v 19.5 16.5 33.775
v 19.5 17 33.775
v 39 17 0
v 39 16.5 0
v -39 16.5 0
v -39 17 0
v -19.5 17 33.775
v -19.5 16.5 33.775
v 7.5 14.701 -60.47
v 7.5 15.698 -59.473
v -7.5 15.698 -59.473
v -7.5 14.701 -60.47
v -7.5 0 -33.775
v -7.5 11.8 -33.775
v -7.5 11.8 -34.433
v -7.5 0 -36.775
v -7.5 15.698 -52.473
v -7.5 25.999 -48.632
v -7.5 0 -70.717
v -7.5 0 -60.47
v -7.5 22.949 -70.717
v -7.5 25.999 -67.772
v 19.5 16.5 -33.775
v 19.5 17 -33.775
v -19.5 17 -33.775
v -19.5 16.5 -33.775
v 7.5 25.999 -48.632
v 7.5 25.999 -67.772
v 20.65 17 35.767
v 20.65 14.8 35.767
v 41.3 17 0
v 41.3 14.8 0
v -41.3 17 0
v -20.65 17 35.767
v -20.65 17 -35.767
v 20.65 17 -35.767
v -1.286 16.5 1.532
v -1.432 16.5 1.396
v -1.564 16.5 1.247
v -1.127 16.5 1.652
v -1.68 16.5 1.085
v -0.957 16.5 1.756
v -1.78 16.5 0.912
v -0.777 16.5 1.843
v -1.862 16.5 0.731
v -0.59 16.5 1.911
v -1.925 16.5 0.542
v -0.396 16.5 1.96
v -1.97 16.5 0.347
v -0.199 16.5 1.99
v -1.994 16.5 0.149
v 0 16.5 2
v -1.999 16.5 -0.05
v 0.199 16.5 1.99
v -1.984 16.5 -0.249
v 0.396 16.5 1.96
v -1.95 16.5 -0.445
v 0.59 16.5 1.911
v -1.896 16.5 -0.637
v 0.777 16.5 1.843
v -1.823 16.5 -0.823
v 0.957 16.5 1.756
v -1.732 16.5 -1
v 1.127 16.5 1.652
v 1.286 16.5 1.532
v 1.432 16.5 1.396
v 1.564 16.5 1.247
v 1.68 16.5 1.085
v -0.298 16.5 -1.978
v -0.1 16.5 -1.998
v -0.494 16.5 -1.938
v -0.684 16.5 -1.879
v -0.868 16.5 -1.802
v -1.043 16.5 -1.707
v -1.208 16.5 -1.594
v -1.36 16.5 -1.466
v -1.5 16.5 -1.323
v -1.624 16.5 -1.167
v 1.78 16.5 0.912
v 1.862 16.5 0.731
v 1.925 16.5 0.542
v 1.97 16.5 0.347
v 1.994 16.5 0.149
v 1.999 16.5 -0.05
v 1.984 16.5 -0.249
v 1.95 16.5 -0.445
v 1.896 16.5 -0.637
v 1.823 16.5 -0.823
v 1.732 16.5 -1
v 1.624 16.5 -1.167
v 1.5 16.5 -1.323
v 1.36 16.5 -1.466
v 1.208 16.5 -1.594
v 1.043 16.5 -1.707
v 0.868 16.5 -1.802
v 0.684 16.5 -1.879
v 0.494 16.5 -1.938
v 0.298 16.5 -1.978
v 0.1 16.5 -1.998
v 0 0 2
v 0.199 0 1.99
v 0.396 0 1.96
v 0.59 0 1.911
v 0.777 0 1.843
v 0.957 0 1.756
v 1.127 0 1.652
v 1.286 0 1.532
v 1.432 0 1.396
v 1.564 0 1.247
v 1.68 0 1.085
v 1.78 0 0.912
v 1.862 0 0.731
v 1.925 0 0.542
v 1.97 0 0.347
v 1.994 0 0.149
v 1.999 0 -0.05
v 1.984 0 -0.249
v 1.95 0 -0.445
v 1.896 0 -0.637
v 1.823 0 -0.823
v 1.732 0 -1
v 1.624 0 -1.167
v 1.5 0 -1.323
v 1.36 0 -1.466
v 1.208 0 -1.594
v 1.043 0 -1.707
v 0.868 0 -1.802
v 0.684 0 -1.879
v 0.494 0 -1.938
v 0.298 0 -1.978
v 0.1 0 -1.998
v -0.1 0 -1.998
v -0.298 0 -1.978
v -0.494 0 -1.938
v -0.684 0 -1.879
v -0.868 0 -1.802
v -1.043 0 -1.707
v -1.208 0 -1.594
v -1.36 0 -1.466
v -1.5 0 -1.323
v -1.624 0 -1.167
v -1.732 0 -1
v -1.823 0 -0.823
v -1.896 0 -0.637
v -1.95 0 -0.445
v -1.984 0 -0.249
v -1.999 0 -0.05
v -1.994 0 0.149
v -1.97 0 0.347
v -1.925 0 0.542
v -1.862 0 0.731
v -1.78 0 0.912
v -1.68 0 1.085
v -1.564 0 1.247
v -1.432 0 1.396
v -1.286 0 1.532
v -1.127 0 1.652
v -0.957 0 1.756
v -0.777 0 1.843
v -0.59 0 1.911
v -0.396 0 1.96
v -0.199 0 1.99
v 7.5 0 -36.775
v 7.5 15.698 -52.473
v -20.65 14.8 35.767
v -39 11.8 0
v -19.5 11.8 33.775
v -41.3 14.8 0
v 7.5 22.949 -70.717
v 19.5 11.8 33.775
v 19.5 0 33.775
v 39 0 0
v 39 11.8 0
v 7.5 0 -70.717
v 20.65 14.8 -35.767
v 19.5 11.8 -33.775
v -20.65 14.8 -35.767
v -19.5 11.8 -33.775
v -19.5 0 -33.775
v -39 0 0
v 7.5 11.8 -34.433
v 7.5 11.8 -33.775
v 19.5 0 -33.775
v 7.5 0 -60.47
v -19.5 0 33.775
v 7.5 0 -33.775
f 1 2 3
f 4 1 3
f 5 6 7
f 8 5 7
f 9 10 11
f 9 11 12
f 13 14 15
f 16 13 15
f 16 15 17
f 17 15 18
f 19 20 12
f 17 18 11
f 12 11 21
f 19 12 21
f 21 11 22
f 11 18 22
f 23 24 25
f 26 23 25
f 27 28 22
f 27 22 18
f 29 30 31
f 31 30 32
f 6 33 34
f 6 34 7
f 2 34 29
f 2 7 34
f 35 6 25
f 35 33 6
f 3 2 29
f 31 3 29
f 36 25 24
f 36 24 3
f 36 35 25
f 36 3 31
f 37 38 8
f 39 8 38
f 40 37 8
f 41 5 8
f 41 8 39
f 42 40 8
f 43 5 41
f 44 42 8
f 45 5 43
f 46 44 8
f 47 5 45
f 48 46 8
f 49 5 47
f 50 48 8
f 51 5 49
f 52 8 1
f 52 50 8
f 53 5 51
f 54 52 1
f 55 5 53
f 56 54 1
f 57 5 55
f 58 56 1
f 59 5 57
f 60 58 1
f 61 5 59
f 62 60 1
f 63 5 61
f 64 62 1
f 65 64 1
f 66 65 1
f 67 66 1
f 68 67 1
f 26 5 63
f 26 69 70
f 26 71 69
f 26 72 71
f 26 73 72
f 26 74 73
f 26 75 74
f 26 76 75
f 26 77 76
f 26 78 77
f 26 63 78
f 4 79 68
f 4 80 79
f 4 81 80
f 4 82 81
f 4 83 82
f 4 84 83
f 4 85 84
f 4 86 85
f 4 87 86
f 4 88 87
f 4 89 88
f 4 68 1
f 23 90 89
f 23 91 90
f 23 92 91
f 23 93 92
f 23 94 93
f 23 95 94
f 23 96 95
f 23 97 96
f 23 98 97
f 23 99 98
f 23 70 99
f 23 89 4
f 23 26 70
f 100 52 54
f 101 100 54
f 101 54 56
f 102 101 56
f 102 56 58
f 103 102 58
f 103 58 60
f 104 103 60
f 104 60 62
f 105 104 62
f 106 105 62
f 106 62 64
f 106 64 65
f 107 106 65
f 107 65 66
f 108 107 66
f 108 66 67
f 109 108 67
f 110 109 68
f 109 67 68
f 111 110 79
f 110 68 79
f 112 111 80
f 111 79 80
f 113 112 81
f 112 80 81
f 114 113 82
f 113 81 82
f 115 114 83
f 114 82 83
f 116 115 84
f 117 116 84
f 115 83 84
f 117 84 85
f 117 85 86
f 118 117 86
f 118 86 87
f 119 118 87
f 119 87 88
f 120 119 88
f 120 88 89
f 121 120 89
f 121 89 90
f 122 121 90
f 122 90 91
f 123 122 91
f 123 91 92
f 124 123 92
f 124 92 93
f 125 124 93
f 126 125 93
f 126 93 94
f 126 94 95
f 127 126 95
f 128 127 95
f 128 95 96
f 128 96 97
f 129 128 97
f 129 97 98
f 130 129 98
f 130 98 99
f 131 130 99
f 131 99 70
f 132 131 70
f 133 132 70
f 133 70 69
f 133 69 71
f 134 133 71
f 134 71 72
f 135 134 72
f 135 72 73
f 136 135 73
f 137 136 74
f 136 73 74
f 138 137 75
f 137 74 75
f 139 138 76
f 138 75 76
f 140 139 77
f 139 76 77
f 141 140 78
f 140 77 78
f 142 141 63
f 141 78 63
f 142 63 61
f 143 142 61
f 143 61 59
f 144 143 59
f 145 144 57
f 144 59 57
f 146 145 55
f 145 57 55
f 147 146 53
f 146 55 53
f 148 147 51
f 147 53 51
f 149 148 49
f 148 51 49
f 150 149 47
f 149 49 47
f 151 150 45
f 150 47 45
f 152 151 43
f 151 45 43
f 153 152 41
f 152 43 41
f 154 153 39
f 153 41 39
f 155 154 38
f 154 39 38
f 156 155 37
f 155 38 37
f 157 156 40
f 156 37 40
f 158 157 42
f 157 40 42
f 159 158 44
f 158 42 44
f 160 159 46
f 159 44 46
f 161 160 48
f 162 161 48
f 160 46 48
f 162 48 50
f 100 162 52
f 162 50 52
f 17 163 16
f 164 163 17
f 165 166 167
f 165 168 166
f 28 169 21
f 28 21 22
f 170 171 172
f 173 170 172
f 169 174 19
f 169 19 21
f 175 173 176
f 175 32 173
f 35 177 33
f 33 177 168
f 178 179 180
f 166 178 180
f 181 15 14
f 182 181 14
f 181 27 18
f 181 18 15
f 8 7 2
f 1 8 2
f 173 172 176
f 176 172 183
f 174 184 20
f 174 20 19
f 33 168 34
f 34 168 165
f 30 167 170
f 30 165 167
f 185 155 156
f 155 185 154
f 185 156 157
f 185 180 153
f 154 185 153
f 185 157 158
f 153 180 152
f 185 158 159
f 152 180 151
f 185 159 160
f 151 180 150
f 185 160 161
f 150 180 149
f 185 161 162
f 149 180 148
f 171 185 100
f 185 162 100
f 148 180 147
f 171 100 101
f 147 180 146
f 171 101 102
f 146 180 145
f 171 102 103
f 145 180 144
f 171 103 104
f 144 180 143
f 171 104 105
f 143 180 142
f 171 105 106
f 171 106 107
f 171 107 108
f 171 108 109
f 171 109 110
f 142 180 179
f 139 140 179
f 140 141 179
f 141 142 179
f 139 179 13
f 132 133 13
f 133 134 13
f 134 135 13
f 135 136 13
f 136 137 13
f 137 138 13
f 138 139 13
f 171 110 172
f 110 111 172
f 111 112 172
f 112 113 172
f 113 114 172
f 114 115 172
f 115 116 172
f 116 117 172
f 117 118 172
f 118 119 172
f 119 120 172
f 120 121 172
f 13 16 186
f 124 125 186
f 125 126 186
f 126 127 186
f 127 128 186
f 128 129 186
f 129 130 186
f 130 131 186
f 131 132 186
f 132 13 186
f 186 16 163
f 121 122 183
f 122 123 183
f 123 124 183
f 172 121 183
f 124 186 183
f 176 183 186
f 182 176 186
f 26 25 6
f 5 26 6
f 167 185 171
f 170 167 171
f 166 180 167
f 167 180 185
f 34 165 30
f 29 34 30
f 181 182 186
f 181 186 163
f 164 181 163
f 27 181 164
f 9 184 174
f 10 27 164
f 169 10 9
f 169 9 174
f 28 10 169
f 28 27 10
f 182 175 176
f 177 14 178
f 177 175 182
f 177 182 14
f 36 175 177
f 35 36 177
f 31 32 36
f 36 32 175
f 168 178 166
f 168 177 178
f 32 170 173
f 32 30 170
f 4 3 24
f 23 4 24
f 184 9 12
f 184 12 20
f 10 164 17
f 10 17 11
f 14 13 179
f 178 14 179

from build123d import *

# Parameters (mm, degrees)
SALIENTE_EXTRUIR1_DEPTH = 11.8
SALIENTE_EXTRUIR2_DEPTH = 2.2
CORTAR_EXTRUIR1_DEPTH   = 0.5
CROQUIS7_R              = 2
CORTAR_EXTRUIR2_DEPTH   = 58.071950338
SALIENTE_EXTRUIR3_DEPTH = 7.5


with BuildPart() as part:
    # Croquis1 → Saliente-Extruir1 (new body)
    with BuildSketch(Plane(origin=(0, 0, 0), x_dir=(1, 0, 0), z_dir=(0, 1, 0))):
        Polygon((19.5, -33.774990748), (39, 0), (19.5, 33.774990748), (-19.5, 33.774990748), (-39, 0), (-19.5, -33.774990748), align=None)
    extrude(amount=SALIENTE_EXTRUIR1_DEPTH)

    # Croquis4 → section 1 of recubrir2
    with BuildSketch(Plane(origin=(0, 14.8, 0), x_dir=(1, 0, 0), z_dir=(0, 1, 0)), mode=Mode.PRIVATE) as recubrir2_s1:
        with BuildLine():
            Line((20.65, -35.766849176), (41.3, 0))
            Line((41.3, 0), (20.65, 35.766849176))
            Line((20.65, 35.766849176), (-20.65, 35.766849176))
            Line((-20.65, 35.766849176), (-41.3, 0))
            Line((-41.3, 0), (-20.65, -35.766849176))
            Line((-20.65, -35.766849176), (20.65, -35.766849176))
        make_face()
    # loft from a face of the part (recubrir2)
    loft([part.faces().sort_by_distance((0, 11.8, 0))[0], recubrir2_s1.sketch])

    # Croquis5 → Saliente-Extruir2 (add)
    with BuildSketch(Plane(origin=(0, 14.8, 0), x_dir=(1, 0, 0), z_dir=(0, 1, 0))):
        Polygon((20.65, -35.766849176), (41.3, 0), (20.65, 35.766849176), (-20.65, 35.766849176), (-41.3, 0), (-20.65, -35.766849176), align=None)
    extrude(amount=SALIENTE_EXTRUIR2_DEPTH)

    # Croquis6 → Cortar-Extruir1 (cut)
    with BuildSketch(Plane(origin=(0, 17, 0), x_dir=(1, 0, 0), z_dir=(0, 1, 0))):
        Polygon((19.5, -33.774990748), (39, 0), (19.5, 33.774990748), (-19.5, 33.774990748), (-39, 0), (-19.5, -33.774990748), align=None)
    extrude(amount=-CORTAR_EXTRUIR1_DEPTH, mode=Mode.SUBTRACT)

    # Croquis7 → Cortar-Extruir2 (cut, through all)
    with BuildSketch(Plane(origin=(0, 16.5, 0), x_dir=(1, 0, 0), z_dir=(0, 1, 0))):
        with Locations(Location((0, 0, 0), (0, 0, 270))):
            Circle(CROQUIS7_R)
    extrude(amount=-CORTAR_EXTRUIR2_DEPTH, mode=Mode.SUBTRACT)

    # Croquis8 → Saliente-Extruir3 (add, symmetric)
    with BuildSketch(Plane(origin=(0, 0, 0), x_dir=(0, 0, -1), z_dir=(1, 0, 0))):
        Polygon((36.774990748, 0), (52.47276129, 15.697770542), (59.47276129, 15.697770542), (60.469781851, 14.700749981), (60.469781851, 0), (70.716946405, 0), (70.716946405, 22.948703413), (67.771594914, 25.998704166), (48.631594914, 25.998704166), (34.432890748, 11.8), (33.774990748, 11.8), (33.774990748, 0), align=None)
    extrude(amount=SALIENTE_EXTRUIR3_DEPTH, both=True)


solid = part.part
